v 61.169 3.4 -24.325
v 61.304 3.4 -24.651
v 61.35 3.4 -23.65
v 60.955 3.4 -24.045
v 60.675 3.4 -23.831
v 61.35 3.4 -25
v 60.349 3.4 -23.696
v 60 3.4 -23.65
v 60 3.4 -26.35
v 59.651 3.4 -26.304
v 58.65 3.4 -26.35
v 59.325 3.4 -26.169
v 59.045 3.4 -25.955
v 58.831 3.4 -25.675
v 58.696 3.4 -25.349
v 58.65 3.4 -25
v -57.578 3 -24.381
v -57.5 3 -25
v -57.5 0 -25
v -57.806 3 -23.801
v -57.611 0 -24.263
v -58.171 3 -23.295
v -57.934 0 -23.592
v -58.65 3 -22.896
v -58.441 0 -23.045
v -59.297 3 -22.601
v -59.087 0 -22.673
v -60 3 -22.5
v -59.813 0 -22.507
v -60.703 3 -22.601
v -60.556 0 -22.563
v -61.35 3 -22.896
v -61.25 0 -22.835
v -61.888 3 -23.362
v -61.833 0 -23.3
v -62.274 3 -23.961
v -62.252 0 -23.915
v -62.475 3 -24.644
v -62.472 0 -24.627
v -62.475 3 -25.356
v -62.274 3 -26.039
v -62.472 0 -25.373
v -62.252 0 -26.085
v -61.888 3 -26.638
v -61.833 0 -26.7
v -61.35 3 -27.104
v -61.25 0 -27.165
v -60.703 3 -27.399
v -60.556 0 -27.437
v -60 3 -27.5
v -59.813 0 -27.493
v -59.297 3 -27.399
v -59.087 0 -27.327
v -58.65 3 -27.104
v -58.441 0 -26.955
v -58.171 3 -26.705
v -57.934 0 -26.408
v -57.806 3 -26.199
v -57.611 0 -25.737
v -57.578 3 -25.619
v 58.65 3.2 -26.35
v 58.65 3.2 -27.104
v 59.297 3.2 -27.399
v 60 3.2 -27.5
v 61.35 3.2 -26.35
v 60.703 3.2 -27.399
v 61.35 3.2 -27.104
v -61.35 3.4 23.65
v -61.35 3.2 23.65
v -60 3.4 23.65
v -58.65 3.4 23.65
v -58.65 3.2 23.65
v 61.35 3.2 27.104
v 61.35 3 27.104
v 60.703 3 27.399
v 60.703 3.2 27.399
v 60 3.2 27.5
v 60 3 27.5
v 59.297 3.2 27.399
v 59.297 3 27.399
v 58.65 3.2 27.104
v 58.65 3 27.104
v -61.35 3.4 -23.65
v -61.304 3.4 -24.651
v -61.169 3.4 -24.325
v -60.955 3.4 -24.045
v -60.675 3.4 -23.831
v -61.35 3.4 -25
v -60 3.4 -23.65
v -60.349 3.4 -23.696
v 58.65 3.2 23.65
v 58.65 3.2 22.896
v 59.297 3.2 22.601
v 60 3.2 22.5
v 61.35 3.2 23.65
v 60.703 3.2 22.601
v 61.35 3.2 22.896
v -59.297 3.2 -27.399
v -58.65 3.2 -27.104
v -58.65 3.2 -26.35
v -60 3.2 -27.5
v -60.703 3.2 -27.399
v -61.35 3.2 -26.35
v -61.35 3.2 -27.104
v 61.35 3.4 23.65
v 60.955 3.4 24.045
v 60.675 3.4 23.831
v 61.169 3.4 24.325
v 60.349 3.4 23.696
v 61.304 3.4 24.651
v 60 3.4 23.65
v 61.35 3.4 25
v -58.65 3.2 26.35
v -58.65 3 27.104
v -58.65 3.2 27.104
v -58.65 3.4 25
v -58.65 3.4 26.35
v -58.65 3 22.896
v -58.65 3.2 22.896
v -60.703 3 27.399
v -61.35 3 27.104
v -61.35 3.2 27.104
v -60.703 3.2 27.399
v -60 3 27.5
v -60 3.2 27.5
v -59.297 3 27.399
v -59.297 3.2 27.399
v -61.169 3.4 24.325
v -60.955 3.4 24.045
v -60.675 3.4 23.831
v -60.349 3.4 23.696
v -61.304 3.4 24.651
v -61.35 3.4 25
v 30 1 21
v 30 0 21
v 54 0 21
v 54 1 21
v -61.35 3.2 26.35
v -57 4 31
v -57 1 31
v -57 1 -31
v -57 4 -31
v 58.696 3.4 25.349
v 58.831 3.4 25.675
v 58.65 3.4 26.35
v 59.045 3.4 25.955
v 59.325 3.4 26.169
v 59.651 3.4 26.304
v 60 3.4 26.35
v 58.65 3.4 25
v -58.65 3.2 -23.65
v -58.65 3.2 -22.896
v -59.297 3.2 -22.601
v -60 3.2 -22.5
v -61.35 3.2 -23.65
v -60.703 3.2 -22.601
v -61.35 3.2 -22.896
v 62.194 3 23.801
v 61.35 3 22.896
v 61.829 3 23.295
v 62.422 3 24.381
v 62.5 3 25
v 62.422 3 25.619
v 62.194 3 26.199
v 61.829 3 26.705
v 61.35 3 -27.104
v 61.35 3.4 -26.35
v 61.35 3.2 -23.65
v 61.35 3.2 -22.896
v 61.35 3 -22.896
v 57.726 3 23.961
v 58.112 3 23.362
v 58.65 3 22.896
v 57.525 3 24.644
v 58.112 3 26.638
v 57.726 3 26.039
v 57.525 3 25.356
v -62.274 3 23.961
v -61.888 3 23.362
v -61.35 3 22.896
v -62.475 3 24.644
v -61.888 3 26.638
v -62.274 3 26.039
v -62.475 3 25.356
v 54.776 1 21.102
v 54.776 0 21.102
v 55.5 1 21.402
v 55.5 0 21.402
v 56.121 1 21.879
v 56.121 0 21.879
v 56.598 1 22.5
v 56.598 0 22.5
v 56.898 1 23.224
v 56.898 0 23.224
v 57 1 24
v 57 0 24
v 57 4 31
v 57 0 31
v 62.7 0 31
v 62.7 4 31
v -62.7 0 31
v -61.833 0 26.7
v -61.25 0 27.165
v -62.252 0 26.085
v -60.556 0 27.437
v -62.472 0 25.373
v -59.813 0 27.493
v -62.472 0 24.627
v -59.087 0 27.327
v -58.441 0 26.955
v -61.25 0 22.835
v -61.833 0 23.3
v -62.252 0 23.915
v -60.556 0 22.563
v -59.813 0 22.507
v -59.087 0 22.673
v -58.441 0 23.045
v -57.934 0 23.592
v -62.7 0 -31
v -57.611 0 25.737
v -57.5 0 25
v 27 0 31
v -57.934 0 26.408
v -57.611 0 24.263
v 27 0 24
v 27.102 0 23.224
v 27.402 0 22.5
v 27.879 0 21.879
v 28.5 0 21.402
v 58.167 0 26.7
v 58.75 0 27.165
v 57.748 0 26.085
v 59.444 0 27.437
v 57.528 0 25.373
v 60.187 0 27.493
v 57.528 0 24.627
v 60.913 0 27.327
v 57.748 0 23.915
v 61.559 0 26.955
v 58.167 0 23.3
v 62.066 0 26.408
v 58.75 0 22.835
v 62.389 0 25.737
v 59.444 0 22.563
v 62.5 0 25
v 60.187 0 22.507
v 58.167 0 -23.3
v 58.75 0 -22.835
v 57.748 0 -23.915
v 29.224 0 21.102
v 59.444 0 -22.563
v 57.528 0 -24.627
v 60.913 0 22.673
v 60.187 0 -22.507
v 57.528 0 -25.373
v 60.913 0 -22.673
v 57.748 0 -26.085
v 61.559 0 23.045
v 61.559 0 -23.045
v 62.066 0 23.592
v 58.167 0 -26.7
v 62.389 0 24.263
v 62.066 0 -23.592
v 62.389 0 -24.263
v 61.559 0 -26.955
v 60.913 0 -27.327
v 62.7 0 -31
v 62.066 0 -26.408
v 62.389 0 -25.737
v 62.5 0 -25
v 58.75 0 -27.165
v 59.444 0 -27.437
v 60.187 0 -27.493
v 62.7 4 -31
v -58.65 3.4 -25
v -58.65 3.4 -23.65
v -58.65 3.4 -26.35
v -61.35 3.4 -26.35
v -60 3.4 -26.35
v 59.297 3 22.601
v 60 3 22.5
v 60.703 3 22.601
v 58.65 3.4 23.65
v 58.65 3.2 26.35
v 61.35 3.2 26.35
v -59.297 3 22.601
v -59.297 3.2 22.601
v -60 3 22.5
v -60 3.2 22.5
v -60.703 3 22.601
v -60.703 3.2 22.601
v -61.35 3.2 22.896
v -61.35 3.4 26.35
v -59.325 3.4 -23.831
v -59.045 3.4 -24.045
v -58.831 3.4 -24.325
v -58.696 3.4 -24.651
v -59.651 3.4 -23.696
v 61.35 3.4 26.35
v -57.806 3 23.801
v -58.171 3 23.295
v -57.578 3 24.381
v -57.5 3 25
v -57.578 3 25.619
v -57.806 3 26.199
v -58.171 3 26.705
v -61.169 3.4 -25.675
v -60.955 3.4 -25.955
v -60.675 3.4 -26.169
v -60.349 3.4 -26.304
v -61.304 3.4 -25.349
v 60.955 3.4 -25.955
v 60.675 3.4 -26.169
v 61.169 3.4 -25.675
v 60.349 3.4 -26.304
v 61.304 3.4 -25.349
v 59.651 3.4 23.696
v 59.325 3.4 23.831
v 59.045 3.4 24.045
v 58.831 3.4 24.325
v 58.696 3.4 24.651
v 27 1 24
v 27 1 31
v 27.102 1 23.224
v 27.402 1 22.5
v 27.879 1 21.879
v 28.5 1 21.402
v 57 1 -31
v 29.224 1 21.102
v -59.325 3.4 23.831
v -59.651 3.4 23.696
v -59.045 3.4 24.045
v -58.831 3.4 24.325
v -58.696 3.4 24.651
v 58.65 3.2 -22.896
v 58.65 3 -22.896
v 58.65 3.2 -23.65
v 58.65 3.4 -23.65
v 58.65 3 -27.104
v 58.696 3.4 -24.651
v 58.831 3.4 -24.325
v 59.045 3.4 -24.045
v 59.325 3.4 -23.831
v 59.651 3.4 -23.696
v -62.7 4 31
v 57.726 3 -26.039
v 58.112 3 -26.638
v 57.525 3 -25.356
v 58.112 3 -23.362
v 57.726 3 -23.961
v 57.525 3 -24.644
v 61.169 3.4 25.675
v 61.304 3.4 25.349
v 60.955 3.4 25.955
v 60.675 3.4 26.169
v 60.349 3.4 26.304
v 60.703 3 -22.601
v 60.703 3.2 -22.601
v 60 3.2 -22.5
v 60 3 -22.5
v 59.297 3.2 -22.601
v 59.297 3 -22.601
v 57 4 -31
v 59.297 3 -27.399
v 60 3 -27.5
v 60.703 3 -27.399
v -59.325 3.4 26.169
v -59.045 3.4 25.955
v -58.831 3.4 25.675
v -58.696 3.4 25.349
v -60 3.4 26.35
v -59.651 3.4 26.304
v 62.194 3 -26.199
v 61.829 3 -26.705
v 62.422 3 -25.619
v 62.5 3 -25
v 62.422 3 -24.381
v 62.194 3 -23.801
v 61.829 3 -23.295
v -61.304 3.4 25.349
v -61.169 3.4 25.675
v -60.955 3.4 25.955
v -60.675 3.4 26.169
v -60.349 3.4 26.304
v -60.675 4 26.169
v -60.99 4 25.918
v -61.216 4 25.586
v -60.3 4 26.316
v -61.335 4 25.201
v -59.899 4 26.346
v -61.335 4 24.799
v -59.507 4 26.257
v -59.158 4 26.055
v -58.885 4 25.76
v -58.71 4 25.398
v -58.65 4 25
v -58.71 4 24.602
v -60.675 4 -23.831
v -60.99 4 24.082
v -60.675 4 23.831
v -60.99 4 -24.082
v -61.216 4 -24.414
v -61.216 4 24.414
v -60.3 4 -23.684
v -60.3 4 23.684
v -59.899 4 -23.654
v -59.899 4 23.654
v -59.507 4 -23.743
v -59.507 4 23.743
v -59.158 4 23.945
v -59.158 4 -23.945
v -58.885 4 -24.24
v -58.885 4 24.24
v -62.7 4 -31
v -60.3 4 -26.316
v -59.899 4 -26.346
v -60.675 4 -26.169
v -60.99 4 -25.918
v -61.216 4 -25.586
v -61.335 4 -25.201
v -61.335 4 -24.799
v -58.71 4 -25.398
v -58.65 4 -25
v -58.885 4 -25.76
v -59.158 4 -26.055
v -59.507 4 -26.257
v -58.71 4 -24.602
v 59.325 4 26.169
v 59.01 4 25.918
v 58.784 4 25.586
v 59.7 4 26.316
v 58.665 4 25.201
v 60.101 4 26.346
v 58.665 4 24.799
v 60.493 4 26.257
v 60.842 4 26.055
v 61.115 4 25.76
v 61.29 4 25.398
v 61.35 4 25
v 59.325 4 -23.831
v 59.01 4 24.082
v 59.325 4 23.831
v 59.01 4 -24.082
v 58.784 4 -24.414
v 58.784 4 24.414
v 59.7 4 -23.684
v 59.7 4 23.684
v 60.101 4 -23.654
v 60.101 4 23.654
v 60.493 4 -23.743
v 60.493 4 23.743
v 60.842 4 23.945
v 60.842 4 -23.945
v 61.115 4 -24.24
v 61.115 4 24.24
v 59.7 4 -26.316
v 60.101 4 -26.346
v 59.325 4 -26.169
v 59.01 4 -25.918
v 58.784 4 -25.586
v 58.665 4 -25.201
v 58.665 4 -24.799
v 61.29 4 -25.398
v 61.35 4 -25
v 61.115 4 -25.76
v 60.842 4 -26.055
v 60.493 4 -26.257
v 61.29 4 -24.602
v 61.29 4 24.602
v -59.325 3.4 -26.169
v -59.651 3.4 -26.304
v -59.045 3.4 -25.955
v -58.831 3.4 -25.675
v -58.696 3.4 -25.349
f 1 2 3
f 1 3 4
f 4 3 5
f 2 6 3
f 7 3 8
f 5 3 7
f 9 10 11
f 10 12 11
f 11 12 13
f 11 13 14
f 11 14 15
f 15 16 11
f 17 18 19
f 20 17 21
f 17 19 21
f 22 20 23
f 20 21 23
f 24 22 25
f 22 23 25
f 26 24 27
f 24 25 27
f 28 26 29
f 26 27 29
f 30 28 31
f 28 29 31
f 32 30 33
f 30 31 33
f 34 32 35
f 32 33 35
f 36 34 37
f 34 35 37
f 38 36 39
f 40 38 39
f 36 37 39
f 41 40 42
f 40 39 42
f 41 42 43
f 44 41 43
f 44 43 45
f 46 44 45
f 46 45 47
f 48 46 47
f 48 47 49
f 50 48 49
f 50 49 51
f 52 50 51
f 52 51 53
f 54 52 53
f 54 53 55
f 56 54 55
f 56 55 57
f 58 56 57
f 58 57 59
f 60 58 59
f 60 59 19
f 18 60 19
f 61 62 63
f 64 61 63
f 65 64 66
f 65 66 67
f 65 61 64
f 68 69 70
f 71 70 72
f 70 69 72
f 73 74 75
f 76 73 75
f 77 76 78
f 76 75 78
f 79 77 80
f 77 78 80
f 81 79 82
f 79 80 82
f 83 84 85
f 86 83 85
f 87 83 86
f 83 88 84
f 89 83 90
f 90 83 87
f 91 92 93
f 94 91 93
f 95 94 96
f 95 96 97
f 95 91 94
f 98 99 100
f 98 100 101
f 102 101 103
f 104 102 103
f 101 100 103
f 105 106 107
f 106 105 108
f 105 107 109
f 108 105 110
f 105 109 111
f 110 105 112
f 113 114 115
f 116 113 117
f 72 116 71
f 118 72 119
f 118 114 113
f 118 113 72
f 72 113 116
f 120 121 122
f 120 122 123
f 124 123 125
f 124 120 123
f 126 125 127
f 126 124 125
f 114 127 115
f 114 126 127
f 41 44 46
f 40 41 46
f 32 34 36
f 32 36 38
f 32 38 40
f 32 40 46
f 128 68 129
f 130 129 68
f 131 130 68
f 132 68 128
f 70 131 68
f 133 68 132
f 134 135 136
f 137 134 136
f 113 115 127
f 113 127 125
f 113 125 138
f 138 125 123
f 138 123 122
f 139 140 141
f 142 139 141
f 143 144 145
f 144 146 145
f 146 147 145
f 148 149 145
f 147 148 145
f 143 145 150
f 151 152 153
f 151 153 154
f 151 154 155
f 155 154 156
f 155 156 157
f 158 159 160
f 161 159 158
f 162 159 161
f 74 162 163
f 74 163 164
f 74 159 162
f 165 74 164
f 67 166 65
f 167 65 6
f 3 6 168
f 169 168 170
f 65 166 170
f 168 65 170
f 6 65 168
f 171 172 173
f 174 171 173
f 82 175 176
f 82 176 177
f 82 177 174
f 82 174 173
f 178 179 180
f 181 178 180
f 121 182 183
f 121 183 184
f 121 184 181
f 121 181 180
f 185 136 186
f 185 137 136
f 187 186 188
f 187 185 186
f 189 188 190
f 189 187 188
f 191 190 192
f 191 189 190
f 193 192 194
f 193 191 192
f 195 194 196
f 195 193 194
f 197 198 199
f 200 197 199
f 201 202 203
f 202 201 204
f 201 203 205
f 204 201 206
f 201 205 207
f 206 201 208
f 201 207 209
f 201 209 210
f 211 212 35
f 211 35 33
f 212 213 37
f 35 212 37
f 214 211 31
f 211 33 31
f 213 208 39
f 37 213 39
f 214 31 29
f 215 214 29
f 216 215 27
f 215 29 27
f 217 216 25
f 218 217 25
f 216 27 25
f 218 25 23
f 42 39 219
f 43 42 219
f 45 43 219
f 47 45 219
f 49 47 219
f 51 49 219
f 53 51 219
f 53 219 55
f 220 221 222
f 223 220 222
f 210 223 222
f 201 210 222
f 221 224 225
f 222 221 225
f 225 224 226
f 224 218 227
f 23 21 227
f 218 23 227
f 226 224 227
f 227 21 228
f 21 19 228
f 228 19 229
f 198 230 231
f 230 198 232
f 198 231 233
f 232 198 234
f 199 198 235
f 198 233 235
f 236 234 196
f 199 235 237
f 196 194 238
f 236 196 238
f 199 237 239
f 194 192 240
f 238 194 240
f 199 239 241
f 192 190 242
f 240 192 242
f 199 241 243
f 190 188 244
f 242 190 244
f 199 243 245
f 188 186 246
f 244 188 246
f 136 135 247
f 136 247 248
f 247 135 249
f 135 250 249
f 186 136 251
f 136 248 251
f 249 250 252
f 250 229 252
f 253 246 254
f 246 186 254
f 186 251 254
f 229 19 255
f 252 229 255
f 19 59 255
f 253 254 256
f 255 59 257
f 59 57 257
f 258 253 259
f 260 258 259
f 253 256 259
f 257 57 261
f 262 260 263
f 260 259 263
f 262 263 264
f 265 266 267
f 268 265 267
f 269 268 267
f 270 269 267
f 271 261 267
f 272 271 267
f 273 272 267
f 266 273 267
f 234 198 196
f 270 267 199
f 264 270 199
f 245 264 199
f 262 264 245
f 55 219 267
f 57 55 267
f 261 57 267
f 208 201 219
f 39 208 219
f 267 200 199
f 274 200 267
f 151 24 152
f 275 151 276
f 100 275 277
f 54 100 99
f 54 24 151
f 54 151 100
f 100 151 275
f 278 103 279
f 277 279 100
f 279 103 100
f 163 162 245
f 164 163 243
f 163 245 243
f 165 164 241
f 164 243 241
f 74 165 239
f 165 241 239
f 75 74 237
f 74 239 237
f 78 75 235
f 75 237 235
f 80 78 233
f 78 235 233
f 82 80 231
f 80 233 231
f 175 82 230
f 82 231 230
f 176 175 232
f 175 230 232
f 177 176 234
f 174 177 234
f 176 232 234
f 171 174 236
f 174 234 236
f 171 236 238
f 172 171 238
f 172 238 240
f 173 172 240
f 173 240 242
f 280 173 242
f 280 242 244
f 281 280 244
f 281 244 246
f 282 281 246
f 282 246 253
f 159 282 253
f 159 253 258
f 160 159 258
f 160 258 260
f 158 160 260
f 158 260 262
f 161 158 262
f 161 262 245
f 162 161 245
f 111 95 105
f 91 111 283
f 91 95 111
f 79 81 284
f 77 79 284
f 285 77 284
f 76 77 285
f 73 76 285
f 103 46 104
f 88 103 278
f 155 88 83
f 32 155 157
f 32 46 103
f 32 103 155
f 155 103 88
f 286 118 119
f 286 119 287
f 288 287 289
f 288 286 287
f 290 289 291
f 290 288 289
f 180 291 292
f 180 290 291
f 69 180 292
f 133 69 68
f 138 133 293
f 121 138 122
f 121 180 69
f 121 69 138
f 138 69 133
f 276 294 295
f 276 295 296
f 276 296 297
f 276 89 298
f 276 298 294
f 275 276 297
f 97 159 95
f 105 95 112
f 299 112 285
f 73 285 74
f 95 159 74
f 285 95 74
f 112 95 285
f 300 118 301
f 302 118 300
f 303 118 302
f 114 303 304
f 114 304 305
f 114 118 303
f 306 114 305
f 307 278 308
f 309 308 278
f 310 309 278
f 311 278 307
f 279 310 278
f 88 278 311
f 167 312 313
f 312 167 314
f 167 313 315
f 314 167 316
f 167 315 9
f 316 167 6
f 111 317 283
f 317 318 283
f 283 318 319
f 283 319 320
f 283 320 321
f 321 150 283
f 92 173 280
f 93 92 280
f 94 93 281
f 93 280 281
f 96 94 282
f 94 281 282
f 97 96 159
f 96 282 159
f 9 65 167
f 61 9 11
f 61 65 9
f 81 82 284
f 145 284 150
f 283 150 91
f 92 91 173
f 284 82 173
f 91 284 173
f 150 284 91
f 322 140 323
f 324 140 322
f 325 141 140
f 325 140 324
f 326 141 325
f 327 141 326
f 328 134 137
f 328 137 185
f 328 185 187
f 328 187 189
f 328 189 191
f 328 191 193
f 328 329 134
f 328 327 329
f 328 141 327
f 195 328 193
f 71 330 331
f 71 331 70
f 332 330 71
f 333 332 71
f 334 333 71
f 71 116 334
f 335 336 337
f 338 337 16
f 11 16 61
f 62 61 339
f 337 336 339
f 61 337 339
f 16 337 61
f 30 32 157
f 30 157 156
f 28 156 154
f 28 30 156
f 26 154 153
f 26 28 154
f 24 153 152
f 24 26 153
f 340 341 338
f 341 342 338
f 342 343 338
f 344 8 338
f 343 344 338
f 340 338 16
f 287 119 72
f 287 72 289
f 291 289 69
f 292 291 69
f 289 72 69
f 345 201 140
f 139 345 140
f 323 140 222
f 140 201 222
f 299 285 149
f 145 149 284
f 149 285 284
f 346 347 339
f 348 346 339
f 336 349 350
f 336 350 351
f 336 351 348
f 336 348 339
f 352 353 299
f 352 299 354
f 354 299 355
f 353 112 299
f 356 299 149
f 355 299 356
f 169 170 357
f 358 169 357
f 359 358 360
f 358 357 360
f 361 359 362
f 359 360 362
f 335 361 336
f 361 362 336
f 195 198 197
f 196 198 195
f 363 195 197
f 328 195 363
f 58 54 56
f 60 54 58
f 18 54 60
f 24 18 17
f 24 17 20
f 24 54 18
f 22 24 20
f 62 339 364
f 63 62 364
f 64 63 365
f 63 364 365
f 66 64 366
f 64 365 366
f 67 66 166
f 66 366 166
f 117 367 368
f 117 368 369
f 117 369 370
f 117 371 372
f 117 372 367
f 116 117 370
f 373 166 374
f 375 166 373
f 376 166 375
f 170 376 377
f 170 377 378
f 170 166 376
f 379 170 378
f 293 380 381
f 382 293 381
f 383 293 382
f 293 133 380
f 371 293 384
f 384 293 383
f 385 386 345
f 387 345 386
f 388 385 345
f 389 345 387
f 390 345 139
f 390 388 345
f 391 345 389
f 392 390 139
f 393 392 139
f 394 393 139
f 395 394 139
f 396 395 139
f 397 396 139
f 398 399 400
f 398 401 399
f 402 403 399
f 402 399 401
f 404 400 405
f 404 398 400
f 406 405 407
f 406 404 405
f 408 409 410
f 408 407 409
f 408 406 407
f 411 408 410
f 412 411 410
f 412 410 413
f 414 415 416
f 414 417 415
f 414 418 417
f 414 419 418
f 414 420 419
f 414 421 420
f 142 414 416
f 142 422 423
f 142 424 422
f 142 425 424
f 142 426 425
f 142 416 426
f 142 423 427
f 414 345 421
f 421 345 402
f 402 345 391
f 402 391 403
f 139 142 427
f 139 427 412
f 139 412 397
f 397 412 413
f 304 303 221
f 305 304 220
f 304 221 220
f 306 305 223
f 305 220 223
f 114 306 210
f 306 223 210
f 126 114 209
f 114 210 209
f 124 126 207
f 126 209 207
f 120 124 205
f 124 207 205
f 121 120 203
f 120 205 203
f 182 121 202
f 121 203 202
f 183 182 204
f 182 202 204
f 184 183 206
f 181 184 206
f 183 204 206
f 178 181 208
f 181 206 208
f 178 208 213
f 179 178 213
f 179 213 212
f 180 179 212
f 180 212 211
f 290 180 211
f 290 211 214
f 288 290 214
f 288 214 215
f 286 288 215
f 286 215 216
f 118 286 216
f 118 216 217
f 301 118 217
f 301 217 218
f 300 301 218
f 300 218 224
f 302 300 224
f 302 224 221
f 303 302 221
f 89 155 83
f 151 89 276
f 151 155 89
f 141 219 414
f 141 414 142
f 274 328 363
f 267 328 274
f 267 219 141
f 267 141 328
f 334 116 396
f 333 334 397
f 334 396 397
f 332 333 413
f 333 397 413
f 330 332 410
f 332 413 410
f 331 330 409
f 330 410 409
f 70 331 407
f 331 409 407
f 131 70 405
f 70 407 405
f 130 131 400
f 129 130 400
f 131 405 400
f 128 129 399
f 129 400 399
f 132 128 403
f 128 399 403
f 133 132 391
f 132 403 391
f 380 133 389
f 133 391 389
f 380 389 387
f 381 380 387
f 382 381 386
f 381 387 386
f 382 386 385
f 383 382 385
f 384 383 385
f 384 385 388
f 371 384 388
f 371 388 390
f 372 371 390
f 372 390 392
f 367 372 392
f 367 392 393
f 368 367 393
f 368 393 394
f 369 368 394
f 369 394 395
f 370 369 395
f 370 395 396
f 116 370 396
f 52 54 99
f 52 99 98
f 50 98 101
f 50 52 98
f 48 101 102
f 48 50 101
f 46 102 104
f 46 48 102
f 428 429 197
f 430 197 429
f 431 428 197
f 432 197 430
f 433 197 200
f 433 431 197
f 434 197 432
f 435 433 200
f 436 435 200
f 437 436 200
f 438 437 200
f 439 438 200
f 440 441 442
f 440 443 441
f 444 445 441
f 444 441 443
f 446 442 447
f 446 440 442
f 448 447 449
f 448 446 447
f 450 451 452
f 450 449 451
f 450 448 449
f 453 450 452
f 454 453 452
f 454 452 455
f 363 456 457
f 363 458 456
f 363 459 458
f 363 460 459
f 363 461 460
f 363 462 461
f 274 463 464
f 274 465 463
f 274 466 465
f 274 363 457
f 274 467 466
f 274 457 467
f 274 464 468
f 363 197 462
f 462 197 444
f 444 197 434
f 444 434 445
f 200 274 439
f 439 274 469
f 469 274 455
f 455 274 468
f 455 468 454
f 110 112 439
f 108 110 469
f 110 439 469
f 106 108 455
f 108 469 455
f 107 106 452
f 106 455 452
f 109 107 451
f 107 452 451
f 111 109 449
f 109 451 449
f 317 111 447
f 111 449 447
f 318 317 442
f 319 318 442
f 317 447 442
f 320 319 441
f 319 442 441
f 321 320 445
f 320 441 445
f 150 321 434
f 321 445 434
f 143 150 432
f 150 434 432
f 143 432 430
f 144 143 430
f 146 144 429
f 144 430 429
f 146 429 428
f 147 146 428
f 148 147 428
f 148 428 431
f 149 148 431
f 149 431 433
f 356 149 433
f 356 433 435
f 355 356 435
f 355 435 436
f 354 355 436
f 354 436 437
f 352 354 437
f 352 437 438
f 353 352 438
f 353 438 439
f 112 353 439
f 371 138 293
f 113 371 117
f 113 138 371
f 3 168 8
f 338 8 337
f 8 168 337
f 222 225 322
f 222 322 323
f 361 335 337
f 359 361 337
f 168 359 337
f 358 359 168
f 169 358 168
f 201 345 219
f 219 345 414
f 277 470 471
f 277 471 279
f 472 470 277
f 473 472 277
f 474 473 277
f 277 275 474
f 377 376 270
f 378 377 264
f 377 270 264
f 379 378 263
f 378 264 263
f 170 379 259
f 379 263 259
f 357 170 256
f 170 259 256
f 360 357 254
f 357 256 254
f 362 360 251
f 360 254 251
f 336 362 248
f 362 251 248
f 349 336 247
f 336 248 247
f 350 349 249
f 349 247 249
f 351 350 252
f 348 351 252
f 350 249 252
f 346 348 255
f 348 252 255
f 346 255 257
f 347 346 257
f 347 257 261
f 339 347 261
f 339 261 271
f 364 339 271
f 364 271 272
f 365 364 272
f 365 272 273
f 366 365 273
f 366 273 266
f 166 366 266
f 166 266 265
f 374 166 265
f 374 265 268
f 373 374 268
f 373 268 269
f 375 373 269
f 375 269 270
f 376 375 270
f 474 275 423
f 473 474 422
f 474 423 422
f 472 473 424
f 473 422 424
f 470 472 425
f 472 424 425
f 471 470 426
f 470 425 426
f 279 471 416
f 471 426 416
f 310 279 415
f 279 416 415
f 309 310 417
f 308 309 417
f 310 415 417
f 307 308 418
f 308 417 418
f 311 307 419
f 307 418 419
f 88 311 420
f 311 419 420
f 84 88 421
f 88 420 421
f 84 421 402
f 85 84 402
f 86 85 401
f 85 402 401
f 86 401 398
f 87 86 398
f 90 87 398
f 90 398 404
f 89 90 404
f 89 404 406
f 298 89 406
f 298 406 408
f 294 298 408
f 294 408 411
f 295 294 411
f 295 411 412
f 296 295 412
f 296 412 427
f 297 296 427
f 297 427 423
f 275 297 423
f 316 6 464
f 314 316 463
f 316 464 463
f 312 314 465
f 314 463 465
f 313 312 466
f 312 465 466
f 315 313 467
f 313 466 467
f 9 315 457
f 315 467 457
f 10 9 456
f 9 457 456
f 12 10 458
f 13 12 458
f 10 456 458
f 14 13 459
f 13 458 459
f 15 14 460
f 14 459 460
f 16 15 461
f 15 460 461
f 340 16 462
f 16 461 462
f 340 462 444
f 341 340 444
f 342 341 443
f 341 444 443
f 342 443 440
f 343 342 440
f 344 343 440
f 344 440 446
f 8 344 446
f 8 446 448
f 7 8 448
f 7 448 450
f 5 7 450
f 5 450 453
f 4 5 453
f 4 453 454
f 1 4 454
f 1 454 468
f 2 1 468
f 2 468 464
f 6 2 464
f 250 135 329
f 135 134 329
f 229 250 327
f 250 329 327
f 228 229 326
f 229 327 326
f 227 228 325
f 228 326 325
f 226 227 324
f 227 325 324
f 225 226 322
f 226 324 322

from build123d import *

# Parameters (mm, degrees)
SKETCH1_W           = 126
SKETCH1_H           = 62
BOSS_EXTRUDE1_DEPTH = 1
SKETCH2_W           = 6
SKETCH2_H           = 62
BOSS_EXTRUDE2_DEPTH = 3
SKETCH3_R           = 1.35
CUT_EXTRUDE1_DEPTH  = 5
SKETCH4_R           = 2.5
CUT_EXTRUDE2_DEPTH  = 3
SKETCH5_W           = 30
SKETCH5_H           = 10
CUT_EXTRUDE3_DEPTH  = 5
FILLET1_R           = 3
CUT_EXTRUDE4_DEPTH  = 0.2
SKETCH7_W           = 2.7
SKETCH7_H           = 2.7
CUT_EXTRUDE5_DEPTH  = 0.2
SKETCH8_W           = 0.3
SKETCH8_H           = 62
CUT_EXTRUDE6_DEPTH  = 5


with BuildPart() as part:
    # Sketch1 → Boss-Extrude1 (new body)
    with BuildSketch(Plane(origin=(0, 0, 0), x_dir=(1, 0, 0), z_dir=(0, 1, 0))):
        Rectangle(SKETCH1_W, SKETCH1_H)
    extrude(amount=BOSS_EXTRUDE1_DEPTH)

    # Sketch2 → Boss-Extrude2 (add)
    with BuildSketch(Plane(origin=(0, 1, 0), x_dir=(1, 0, 0), z_dir=(0, 1, 0))):
        with Locations((-60, 0)):
            Rectangle(SKETCH2_W, SKETCH2_H)
        with Locations((60, 0)):
            Rectangle(SKETCH2_W, SKETCH2_H)
    extrude(amount=BOSS_EXTRUDE2_DEPTH)

    # Sketch3 → Cut-Extrude1 (cut, through all)
    with BuildSketch(Plane(origin=(0, 4, 0), x_dir=(1, 0, 0), z_dir=(0, 1, 0))):
        with Locations((-60, 25)):
            Circle(SKETCH3_R)
        with Locations((-60, -25)):
            Circle(SKETCH3_R)
        with Locations((60, -25)):
            Circle(SKETCH3_R)
        with Locations((60, 25)):
            Circle(SKETCH3_R)
    extrude(amount=-CUT_EXTRUDE1_DEPTH, mode=Mode.SUBTRACT)

    # Sketch4 → Cut-Extrude2 (cut)
    with BuildSketch(Plane.XZ):
        with Locations((60, -25)):
            Circle(SKETCH4_R)
        with Locations((60, 25)):
            Circle(SKETCH4_R)
        with Locations((-60, 25)):
            Circle(SKETCH4_R)
        with Locations((-60, -25)):
            Circle(SKETCH4_R)
    extrude(amount=-CUT_EXTRUDE2_DEPTH, mode=Mode.SUBTRACT)

    # Sketch5 → Cut-Extrude3 (cut, through all)
    with BuildSketch(Plane.XZ):
        with Locations((42, 26)):
            Rectangle(SKETCH5_W, SKETCH5_H)
    extrude(amount=-CUT_EXTRUDE3_DEPTH, mode=Mode.SUBTRACT)

    # Fillet1
    fillet1_edges = [part.edges().sort_by_distance(p)[0] for p in [
        (27, 0.5, 21),
        (57, 0.5, 21),
    ]]
    fillet(fillet1_edges, radius=FILLET1_R)

    # Sketch6 → Cut-Extrude4 (cut)
    with BuildSketch(Plane.XZ.offset(-3)):
        with BuildLine():
            Line((-61.35, 22.895837459), (-61.35, 27.104162541))
            ThreePointArc((-61.35, 27.104162541), (-60, 27.5), (-58.65, 27.104162541))
            Line((-58.65, 27.104162541), (-58.65, 22.895837459))
            ThreePointArc((-58.65, 22.895837459), (-60, 22.5), (-61.35, 22.895837459))
        make_face()
        with BuildLine():
            Line((-61.35, -27.104162541), (-61.35, -22.895837459))
            ThreePointArc((-61.35, -22.895837459), (-60, -22.5), (-58.65, -22.895837459))
            Line((-58.65, -22.895837459), (-58.65, -27.104162541))
            ThreePointArc((-58.65, -27.104162541), (-60, -27.5), (-61.35, -27.104162541))
        make_face()
    cut_extrude4 = extrude(amount=-CUT_EXTRUDE4_DEPTH, mode=Mode.SUBTRACT)

    # Sketch7 → Cut-Extrude5 (cut)
    with BuildSketch(Plane.XZ.offset(-3.2)):
        with Locations((-60, -25)):
            Rectangle(SKETCH7_W, SKETCH7_H)
        with Locations((-60, 25)):
            Rectangle(SKETCH7_W, SKETCH7_H)
    cut_extrude5 = extrude(amount=-CUT_EXTRUDE5_DEPTH, mode=Mode.SUBTRACT)

    # Mirror1: Cut-Extrude4, Cut-Extrude5 across plane
    add(cut_extrude4.mirror(Plane(origin=(0, 0, 0), x_dir=(0, 0, 1), z_dir=(1, 0, 0))), mode=Mode.SUBTRACT)
    add(cut_extrude5.mirror(Plane(origin=(0, 0, 0), x_dir=(0, 0, 1), z_dir=(1, 0, 0))), mode=Mode.SUBTRACT)

    # Sketch8 → Cut-Extrude6 (cut, through all)
    with BuildSketch(Plane(origin=(0, 4, 0), x_dir=(1, 0, 0), z_dir=(0, 1, 0))):
        with Locations((-62.85, 0)):
            Rectangle(SKETCH8_W, SKETCH8_H)
        with Locations((62.85, 0)):
            Rectangle(SKETCH8_W, SKETCH8_H)
    extrude(amount=-CUT_EXTRUDE6_DEPTH, mode=Mode.SUBTRACT)


solid = part.part
